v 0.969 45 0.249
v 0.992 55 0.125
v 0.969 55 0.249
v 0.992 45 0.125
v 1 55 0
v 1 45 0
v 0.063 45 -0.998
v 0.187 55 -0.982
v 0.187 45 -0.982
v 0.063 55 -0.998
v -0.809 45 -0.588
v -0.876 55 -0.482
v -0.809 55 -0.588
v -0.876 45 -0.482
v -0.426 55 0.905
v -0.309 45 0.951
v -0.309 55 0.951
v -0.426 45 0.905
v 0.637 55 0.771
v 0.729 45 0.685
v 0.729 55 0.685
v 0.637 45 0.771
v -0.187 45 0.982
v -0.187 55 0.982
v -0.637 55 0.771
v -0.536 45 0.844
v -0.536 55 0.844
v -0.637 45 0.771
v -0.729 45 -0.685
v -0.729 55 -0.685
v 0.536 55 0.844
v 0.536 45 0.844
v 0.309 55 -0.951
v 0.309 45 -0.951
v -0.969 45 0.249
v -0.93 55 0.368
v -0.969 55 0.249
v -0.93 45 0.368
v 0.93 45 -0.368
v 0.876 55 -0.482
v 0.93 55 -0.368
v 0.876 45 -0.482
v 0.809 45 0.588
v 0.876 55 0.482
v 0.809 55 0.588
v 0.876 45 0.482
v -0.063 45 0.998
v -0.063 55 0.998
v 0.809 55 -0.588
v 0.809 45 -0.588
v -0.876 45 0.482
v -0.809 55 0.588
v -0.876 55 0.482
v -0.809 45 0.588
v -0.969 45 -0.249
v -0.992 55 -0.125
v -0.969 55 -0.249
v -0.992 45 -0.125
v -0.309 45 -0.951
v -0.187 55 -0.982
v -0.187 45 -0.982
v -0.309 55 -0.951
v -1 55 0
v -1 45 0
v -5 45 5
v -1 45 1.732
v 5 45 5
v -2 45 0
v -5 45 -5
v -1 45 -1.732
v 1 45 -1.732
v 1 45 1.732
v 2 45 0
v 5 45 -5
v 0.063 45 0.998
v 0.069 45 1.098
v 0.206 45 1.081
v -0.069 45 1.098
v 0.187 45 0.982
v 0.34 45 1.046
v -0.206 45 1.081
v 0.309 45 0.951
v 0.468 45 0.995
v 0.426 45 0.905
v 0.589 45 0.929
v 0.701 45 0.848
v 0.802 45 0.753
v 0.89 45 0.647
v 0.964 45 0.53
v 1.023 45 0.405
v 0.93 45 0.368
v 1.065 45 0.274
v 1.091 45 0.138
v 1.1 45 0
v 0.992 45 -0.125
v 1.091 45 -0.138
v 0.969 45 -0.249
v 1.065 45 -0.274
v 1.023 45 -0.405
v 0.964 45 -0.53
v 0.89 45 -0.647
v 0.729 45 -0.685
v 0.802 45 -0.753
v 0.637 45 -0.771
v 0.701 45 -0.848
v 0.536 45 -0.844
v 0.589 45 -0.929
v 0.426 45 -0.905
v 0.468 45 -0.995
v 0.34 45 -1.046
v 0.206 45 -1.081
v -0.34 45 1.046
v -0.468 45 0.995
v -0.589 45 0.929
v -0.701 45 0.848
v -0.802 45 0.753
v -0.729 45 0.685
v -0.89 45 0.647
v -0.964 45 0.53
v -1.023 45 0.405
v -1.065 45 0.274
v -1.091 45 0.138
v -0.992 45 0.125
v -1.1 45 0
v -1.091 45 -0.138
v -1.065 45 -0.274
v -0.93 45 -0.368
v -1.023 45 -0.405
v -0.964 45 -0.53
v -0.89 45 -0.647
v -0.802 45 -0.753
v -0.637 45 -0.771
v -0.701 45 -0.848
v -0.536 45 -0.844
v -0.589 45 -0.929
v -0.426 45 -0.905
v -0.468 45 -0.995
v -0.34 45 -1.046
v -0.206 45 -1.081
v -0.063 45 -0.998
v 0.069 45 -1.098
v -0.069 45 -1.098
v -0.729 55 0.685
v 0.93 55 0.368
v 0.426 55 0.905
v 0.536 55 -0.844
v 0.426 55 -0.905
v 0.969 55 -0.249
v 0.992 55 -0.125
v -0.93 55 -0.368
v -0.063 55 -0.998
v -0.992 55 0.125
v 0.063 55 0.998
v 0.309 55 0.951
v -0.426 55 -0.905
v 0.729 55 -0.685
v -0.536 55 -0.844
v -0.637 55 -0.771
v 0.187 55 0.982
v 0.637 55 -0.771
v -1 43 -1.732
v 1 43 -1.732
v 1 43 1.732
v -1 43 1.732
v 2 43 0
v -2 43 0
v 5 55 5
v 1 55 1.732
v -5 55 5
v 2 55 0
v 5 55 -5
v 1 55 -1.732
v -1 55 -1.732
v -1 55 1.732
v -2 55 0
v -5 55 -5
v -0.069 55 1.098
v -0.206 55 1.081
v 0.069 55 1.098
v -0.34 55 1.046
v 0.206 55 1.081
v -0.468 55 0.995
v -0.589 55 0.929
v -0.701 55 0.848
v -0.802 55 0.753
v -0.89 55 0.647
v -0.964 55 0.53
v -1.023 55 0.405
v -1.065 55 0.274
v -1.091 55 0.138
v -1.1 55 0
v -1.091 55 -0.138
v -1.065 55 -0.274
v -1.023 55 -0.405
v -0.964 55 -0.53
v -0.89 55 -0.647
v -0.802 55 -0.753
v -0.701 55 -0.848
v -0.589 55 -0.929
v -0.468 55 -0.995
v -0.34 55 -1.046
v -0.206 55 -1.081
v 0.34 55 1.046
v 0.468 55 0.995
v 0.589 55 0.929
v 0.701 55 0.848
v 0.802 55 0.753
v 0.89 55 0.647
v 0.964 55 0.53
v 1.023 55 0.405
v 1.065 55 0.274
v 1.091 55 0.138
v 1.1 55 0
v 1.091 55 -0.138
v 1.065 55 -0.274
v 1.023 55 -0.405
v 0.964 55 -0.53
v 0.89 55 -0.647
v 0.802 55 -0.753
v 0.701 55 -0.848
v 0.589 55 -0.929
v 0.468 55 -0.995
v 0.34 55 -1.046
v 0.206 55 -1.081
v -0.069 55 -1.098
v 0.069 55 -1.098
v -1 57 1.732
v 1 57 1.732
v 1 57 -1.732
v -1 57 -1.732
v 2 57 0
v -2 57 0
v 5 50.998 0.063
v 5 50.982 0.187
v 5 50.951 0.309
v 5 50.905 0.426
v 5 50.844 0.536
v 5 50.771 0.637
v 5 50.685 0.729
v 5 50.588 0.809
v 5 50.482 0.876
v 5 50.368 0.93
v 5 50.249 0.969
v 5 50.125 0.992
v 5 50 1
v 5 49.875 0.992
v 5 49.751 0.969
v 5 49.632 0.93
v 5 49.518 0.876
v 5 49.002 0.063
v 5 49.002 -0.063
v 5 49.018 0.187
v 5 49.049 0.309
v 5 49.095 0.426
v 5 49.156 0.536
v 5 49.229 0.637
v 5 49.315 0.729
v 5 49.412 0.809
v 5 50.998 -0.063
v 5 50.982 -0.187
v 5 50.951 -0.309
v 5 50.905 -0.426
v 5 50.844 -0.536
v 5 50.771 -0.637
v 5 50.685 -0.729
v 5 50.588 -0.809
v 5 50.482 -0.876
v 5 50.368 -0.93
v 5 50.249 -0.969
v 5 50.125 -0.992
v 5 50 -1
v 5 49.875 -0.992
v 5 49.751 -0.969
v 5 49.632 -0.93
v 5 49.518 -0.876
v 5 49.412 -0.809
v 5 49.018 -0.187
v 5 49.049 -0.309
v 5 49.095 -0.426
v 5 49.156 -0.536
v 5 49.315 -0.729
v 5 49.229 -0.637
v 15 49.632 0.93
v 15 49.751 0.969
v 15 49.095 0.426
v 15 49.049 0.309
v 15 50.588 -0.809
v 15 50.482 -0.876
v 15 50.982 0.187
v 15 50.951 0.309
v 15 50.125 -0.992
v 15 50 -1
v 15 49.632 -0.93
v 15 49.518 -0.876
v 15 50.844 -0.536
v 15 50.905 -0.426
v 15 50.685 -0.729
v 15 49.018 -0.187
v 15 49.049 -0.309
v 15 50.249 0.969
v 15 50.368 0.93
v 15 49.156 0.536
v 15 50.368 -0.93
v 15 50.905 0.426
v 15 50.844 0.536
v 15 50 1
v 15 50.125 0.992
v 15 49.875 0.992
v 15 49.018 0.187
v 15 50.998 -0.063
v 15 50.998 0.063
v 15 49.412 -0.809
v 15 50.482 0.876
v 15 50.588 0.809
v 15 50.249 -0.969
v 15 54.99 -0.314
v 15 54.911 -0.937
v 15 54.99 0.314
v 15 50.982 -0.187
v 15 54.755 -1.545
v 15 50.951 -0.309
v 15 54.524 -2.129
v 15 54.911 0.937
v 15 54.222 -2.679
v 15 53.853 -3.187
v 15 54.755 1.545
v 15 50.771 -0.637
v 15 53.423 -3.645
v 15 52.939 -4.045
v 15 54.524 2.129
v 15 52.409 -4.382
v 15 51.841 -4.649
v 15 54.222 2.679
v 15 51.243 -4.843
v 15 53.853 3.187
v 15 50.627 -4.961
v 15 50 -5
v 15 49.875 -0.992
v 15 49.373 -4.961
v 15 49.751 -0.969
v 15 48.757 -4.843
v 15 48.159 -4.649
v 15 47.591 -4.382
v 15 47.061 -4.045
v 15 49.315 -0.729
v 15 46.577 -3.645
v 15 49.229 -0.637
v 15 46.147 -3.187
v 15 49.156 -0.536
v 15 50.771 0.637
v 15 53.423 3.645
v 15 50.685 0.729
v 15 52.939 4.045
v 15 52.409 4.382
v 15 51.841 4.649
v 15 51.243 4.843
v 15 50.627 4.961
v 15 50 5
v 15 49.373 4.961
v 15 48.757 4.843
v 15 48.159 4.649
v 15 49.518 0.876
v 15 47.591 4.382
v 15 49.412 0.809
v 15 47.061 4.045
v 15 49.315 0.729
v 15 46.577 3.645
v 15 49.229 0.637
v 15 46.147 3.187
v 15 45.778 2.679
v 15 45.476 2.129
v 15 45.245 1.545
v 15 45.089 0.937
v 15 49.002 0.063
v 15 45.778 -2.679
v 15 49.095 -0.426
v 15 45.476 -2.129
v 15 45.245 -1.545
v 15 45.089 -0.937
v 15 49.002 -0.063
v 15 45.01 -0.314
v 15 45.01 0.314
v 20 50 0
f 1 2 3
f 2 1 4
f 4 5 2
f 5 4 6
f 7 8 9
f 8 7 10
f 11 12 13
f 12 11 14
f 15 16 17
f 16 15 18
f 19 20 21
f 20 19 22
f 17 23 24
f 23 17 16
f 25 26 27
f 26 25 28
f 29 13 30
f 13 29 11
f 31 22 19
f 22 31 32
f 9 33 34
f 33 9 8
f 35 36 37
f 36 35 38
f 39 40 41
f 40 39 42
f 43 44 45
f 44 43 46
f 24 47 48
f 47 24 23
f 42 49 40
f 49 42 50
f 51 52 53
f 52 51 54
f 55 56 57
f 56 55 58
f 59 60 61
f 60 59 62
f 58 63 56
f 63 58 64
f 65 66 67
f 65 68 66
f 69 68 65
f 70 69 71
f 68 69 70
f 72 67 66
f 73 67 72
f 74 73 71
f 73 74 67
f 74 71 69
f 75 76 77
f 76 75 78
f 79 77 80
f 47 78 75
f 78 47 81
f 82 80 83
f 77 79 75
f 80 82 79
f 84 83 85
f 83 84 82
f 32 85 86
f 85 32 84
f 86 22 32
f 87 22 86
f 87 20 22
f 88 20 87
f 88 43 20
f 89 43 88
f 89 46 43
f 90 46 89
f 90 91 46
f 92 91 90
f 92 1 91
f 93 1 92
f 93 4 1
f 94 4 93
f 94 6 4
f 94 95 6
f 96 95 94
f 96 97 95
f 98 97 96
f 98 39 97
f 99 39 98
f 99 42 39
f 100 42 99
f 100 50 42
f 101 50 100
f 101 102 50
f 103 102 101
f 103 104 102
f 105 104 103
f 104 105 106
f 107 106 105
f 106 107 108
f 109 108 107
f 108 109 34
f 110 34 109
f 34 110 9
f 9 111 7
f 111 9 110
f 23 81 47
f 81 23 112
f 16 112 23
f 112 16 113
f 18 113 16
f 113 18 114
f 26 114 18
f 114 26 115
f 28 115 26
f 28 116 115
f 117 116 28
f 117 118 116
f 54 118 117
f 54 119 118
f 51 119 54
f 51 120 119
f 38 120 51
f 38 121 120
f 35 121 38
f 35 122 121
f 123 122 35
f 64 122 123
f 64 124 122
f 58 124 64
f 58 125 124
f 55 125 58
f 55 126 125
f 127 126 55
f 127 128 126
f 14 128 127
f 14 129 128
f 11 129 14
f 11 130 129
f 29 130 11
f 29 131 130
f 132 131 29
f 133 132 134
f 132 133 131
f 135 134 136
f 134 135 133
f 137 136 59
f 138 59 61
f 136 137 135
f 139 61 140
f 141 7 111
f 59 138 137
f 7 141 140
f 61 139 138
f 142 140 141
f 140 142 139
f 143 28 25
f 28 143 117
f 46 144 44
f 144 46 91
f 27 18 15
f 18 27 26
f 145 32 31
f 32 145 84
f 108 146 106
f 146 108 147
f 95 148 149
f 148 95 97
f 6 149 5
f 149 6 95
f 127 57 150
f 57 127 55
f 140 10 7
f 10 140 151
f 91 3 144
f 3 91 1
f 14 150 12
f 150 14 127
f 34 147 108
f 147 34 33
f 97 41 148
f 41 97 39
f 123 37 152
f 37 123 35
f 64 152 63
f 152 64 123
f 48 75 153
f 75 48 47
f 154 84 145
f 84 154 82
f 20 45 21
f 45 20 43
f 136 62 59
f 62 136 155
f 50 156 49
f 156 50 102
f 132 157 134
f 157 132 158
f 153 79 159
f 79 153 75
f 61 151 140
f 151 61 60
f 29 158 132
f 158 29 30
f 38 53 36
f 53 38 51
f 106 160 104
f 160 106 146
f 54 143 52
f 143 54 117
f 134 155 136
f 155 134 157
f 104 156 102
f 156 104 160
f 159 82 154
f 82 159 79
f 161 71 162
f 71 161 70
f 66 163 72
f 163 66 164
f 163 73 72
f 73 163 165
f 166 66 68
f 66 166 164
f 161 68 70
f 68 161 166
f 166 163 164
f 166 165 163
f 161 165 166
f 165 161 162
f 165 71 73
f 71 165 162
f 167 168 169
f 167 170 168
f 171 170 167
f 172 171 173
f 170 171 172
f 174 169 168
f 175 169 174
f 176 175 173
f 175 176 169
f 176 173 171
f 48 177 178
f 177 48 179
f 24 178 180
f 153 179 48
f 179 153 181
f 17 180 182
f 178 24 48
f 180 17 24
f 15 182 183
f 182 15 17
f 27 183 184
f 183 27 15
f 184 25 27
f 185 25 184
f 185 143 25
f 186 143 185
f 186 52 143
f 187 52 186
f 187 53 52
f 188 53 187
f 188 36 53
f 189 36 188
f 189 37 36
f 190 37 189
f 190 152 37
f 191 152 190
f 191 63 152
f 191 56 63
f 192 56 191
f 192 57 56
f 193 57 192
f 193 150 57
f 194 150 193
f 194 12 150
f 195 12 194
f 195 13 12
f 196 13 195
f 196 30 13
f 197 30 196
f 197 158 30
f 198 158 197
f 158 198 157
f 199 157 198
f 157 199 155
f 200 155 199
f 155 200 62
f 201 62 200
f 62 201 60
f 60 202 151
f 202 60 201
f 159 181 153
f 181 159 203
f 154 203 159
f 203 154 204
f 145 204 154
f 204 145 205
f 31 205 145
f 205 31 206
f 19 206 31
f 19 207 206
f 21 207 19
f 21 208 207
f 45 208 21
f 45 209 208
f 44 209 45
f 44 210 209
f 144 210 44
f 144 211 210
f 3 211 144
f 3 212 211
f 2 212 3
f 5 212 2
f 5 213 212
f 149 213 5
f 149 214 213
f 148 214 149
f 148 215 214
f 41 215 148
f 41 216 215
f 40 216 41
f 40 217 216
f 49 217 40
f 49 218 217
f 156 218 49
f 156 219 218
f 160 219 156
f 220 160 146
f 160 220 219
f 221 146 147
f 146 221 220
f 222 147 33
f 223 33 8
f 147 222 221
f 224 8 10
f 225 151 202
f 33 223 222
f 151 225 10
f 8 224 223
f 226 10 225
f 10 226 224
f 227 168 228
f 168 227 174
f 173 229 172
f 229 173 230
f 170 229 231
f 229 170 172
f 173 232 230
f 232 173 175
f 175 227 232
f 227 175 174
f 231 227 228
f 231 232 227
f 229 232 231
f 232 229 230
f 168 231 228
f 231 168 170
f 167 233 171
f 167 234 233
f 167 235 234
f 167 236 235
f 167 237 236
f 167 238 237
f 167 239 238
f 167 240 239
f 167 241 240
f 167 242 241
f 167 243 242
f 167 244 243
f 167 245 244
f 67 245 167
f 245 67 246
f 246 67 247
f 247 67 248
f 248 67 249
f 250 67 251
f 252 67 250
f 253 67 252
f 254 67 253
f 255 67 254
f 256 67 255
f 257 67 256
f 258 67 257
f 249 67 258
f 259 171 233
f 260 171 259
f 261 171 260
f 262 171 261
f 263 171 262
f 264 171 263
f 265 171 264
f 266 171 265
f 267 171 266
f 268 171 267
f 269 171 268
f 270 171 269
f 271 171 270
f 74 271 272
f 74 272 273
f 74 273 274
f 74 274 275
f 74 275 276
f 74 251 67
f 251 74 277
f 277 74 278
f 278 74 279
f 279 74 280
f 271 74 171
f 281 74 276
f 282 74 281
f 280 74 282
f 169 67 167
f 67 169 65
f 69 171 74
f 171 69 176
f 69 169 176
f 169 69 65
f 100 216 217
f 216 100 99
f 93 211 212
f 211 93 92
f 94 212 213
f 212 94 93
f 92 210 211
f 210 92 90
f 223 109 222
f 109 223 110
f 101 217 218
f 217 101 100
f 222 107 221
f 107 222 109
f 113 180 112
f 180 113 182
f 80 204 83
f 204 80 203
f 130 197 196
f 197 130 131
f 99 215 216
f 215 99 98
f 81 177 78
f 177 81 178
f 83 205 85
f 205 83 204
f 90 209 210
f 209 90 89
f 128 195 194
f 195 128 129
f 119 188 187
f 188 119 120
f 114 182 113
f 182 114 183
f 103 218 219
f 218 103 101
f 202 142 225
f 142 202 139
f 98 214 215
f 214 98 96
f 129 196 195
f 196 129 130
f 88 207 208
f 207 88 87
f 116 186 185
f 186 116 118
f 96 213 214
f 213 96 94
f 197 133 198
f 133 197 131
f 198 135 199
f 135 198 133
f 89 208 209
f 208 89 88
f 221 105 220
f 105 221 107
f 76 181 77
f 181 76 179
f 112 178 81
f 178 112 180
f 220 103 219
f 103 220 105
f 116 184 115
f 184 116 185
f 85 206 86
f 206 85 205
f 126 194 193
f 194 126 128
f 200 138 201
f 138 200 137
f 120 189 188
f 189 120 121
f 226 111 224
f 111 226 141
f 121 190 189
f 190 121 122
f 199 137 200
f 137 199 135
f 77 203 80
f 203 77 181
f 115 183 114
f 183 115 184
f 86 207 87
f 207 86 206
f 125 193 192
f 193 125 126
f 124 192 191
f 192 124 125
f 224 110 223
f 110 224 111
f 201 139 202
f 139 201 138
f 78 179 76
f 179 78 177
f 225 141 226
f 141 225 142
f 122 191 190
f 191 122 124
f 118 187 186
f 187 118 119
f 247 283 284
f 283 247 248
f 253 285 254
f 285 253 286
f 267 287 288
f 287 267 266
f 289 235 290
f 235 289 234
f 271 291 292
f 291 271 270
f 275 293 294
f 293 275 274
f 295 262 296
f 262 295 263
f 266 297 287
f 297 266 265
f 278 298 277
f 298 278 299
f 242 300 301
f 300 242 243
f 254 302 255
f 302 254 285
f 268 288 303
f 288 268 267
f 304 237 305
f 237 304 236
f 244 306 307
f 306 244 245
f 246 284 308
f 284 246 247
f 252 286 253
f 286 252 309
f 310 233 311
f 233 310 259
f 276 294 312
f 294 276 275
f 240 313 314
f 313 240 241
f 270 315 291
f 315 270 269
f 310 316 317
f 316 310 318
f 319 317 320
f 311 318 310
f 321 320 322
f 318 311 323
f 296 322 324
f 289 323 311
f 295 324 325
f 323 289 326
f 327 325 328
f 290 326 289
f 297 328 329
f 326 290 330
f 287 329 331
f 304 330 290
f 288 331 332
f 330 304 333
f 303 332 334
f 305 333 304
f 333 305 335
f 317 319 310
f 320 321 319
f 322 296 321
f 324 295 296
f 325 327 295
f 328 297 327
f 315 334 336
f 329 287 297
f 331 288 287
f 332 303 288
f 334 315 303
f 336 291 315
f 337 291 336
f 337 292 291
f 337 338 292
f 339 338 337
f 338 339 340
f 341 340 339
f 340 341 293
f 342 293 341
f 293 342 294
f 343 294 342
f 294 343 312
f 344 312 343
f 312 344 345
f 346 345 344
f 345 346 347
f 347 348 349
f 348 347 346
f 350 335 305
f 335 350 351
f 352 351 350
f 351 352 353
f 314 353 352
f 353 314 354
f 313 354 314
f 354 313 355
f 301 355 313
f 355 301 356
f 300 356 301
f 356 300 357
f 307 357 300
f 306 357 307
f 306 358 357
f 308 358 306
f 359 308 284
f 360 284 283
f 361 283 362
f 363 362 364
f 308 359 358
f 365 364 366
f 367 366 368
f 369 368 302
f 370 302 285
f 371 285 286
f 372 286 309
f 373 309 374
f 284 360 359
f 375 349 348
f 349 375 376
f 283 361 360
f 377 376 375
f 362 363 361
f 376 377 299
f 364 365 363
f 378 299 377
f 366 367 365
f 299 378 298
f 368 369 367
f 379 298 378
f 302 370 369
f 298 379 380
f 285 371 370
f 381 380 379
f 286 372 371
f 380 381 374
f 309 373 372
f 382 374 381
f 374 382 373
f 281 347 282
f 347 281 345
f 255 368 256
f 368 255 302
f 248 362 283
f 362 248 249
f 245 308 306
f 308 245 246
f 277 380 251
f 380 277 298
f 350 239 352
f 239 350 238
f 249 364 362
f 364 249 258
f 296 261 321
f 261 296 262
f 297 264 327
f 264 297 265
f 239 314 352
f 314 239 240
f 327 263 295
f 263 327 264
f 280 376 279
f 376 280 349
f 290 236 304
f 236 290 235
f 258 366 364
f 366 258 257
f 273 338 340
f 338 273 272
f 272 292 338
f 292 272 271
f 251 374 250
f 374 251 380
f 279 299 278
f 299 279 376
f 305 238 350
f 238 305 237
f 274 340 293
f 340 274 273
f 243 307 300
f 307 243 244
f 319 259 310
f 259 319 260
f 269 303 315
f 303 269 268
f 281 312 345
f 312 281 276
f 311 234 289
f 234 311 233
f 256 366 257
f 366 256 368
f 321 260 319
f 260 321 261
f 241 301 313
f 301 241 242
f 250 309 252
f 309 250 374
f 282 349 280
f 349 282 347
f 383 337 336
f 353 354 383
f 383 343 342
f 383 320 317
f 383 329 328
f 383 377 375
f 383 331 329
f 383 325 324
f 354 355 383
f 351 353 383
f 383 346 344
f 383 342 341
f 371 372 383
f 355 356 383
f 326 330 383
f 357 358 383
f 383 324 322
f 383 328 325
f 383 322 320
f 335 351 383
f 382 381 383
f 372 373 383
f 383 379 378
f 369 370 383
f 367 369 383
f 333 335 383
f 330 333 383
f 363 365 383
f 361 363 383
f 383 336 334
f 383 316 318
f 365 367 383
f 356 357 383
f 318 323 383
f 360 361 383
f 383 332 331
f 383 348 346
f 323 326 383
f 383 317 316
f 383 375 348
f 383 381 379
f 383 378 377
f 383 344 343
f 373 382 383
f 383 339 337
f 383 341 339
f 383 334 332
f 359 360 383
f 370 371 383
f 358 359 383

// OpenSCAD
$fn =50;

yA=[$t*10,0,0];
xA=[0,$t*20,0];

y=[10,0,0];
x=[0,10,0];
z=[0,0,10];


/**
/ ASSEMBLY
**/

translate( [0,50,0] ) {
    explode(xA, center=true,enable=true) {
        part1();
        rotate ([180,0,0]) part1();
    }
    explode(yA, center=true,enable=true) {
        part2();
        part3();
        part4();
    }
}
    
/**
/ Sub-Assemblies
**/    
    
module part1(){
    translate ([0,0,0]) rotate ([90,0,0]) cylinder(5);
    translate ([0,-5,0]) rotate ([90,0,0]) cylinder(r=2,h=2,$fn=6);
}

module part2(){
    difference(){
        cube(10,center=true);
        rotate([90,0,0]) cylinder(r=1.1,h=11,center=true);
    }
}

module part3(){
    translate ([10,0,0]) rotate([0,90,0]) cylinder(10,center=true); 
}

module part4(){
    translate ([15,0,0]) rotate([0,90,0]) cylinder(r1=5,r2=0,h=5);       
}

/**
 /* The Actual Module
  */

module explode( distance, center, enable ) {
    if ( (enable) && (!center) ) {   
     for ( i= [0:1:$children-1])   // step needed in case $children < 2                
        translate( [i*distance[0],i*distance[1],i*distance[2]] ) {
            children(i);
        } 
    }
    //CENTERED
    if ( (enable) && (center) ) {
        count = $children - 1;
        explode_start = ( [ (count*distance[0])/2 * -1, (count*distance[1])/2 *-1,(count*distance[2])/2 * -1 ] ) ;
        for ( i= [0:1:$children-1])   // step needed in case $children < 2  
        translate( explode_start ) {
            translate( [i*distance[0],i*distance[1],i*distance[2] ] ) {
                children(i);
            }    
        }
    }
    else {        
        for ( i= [0:1:$children-1]){   // step needed in case $children < 2     
            children(i);
        }         
    }
}
